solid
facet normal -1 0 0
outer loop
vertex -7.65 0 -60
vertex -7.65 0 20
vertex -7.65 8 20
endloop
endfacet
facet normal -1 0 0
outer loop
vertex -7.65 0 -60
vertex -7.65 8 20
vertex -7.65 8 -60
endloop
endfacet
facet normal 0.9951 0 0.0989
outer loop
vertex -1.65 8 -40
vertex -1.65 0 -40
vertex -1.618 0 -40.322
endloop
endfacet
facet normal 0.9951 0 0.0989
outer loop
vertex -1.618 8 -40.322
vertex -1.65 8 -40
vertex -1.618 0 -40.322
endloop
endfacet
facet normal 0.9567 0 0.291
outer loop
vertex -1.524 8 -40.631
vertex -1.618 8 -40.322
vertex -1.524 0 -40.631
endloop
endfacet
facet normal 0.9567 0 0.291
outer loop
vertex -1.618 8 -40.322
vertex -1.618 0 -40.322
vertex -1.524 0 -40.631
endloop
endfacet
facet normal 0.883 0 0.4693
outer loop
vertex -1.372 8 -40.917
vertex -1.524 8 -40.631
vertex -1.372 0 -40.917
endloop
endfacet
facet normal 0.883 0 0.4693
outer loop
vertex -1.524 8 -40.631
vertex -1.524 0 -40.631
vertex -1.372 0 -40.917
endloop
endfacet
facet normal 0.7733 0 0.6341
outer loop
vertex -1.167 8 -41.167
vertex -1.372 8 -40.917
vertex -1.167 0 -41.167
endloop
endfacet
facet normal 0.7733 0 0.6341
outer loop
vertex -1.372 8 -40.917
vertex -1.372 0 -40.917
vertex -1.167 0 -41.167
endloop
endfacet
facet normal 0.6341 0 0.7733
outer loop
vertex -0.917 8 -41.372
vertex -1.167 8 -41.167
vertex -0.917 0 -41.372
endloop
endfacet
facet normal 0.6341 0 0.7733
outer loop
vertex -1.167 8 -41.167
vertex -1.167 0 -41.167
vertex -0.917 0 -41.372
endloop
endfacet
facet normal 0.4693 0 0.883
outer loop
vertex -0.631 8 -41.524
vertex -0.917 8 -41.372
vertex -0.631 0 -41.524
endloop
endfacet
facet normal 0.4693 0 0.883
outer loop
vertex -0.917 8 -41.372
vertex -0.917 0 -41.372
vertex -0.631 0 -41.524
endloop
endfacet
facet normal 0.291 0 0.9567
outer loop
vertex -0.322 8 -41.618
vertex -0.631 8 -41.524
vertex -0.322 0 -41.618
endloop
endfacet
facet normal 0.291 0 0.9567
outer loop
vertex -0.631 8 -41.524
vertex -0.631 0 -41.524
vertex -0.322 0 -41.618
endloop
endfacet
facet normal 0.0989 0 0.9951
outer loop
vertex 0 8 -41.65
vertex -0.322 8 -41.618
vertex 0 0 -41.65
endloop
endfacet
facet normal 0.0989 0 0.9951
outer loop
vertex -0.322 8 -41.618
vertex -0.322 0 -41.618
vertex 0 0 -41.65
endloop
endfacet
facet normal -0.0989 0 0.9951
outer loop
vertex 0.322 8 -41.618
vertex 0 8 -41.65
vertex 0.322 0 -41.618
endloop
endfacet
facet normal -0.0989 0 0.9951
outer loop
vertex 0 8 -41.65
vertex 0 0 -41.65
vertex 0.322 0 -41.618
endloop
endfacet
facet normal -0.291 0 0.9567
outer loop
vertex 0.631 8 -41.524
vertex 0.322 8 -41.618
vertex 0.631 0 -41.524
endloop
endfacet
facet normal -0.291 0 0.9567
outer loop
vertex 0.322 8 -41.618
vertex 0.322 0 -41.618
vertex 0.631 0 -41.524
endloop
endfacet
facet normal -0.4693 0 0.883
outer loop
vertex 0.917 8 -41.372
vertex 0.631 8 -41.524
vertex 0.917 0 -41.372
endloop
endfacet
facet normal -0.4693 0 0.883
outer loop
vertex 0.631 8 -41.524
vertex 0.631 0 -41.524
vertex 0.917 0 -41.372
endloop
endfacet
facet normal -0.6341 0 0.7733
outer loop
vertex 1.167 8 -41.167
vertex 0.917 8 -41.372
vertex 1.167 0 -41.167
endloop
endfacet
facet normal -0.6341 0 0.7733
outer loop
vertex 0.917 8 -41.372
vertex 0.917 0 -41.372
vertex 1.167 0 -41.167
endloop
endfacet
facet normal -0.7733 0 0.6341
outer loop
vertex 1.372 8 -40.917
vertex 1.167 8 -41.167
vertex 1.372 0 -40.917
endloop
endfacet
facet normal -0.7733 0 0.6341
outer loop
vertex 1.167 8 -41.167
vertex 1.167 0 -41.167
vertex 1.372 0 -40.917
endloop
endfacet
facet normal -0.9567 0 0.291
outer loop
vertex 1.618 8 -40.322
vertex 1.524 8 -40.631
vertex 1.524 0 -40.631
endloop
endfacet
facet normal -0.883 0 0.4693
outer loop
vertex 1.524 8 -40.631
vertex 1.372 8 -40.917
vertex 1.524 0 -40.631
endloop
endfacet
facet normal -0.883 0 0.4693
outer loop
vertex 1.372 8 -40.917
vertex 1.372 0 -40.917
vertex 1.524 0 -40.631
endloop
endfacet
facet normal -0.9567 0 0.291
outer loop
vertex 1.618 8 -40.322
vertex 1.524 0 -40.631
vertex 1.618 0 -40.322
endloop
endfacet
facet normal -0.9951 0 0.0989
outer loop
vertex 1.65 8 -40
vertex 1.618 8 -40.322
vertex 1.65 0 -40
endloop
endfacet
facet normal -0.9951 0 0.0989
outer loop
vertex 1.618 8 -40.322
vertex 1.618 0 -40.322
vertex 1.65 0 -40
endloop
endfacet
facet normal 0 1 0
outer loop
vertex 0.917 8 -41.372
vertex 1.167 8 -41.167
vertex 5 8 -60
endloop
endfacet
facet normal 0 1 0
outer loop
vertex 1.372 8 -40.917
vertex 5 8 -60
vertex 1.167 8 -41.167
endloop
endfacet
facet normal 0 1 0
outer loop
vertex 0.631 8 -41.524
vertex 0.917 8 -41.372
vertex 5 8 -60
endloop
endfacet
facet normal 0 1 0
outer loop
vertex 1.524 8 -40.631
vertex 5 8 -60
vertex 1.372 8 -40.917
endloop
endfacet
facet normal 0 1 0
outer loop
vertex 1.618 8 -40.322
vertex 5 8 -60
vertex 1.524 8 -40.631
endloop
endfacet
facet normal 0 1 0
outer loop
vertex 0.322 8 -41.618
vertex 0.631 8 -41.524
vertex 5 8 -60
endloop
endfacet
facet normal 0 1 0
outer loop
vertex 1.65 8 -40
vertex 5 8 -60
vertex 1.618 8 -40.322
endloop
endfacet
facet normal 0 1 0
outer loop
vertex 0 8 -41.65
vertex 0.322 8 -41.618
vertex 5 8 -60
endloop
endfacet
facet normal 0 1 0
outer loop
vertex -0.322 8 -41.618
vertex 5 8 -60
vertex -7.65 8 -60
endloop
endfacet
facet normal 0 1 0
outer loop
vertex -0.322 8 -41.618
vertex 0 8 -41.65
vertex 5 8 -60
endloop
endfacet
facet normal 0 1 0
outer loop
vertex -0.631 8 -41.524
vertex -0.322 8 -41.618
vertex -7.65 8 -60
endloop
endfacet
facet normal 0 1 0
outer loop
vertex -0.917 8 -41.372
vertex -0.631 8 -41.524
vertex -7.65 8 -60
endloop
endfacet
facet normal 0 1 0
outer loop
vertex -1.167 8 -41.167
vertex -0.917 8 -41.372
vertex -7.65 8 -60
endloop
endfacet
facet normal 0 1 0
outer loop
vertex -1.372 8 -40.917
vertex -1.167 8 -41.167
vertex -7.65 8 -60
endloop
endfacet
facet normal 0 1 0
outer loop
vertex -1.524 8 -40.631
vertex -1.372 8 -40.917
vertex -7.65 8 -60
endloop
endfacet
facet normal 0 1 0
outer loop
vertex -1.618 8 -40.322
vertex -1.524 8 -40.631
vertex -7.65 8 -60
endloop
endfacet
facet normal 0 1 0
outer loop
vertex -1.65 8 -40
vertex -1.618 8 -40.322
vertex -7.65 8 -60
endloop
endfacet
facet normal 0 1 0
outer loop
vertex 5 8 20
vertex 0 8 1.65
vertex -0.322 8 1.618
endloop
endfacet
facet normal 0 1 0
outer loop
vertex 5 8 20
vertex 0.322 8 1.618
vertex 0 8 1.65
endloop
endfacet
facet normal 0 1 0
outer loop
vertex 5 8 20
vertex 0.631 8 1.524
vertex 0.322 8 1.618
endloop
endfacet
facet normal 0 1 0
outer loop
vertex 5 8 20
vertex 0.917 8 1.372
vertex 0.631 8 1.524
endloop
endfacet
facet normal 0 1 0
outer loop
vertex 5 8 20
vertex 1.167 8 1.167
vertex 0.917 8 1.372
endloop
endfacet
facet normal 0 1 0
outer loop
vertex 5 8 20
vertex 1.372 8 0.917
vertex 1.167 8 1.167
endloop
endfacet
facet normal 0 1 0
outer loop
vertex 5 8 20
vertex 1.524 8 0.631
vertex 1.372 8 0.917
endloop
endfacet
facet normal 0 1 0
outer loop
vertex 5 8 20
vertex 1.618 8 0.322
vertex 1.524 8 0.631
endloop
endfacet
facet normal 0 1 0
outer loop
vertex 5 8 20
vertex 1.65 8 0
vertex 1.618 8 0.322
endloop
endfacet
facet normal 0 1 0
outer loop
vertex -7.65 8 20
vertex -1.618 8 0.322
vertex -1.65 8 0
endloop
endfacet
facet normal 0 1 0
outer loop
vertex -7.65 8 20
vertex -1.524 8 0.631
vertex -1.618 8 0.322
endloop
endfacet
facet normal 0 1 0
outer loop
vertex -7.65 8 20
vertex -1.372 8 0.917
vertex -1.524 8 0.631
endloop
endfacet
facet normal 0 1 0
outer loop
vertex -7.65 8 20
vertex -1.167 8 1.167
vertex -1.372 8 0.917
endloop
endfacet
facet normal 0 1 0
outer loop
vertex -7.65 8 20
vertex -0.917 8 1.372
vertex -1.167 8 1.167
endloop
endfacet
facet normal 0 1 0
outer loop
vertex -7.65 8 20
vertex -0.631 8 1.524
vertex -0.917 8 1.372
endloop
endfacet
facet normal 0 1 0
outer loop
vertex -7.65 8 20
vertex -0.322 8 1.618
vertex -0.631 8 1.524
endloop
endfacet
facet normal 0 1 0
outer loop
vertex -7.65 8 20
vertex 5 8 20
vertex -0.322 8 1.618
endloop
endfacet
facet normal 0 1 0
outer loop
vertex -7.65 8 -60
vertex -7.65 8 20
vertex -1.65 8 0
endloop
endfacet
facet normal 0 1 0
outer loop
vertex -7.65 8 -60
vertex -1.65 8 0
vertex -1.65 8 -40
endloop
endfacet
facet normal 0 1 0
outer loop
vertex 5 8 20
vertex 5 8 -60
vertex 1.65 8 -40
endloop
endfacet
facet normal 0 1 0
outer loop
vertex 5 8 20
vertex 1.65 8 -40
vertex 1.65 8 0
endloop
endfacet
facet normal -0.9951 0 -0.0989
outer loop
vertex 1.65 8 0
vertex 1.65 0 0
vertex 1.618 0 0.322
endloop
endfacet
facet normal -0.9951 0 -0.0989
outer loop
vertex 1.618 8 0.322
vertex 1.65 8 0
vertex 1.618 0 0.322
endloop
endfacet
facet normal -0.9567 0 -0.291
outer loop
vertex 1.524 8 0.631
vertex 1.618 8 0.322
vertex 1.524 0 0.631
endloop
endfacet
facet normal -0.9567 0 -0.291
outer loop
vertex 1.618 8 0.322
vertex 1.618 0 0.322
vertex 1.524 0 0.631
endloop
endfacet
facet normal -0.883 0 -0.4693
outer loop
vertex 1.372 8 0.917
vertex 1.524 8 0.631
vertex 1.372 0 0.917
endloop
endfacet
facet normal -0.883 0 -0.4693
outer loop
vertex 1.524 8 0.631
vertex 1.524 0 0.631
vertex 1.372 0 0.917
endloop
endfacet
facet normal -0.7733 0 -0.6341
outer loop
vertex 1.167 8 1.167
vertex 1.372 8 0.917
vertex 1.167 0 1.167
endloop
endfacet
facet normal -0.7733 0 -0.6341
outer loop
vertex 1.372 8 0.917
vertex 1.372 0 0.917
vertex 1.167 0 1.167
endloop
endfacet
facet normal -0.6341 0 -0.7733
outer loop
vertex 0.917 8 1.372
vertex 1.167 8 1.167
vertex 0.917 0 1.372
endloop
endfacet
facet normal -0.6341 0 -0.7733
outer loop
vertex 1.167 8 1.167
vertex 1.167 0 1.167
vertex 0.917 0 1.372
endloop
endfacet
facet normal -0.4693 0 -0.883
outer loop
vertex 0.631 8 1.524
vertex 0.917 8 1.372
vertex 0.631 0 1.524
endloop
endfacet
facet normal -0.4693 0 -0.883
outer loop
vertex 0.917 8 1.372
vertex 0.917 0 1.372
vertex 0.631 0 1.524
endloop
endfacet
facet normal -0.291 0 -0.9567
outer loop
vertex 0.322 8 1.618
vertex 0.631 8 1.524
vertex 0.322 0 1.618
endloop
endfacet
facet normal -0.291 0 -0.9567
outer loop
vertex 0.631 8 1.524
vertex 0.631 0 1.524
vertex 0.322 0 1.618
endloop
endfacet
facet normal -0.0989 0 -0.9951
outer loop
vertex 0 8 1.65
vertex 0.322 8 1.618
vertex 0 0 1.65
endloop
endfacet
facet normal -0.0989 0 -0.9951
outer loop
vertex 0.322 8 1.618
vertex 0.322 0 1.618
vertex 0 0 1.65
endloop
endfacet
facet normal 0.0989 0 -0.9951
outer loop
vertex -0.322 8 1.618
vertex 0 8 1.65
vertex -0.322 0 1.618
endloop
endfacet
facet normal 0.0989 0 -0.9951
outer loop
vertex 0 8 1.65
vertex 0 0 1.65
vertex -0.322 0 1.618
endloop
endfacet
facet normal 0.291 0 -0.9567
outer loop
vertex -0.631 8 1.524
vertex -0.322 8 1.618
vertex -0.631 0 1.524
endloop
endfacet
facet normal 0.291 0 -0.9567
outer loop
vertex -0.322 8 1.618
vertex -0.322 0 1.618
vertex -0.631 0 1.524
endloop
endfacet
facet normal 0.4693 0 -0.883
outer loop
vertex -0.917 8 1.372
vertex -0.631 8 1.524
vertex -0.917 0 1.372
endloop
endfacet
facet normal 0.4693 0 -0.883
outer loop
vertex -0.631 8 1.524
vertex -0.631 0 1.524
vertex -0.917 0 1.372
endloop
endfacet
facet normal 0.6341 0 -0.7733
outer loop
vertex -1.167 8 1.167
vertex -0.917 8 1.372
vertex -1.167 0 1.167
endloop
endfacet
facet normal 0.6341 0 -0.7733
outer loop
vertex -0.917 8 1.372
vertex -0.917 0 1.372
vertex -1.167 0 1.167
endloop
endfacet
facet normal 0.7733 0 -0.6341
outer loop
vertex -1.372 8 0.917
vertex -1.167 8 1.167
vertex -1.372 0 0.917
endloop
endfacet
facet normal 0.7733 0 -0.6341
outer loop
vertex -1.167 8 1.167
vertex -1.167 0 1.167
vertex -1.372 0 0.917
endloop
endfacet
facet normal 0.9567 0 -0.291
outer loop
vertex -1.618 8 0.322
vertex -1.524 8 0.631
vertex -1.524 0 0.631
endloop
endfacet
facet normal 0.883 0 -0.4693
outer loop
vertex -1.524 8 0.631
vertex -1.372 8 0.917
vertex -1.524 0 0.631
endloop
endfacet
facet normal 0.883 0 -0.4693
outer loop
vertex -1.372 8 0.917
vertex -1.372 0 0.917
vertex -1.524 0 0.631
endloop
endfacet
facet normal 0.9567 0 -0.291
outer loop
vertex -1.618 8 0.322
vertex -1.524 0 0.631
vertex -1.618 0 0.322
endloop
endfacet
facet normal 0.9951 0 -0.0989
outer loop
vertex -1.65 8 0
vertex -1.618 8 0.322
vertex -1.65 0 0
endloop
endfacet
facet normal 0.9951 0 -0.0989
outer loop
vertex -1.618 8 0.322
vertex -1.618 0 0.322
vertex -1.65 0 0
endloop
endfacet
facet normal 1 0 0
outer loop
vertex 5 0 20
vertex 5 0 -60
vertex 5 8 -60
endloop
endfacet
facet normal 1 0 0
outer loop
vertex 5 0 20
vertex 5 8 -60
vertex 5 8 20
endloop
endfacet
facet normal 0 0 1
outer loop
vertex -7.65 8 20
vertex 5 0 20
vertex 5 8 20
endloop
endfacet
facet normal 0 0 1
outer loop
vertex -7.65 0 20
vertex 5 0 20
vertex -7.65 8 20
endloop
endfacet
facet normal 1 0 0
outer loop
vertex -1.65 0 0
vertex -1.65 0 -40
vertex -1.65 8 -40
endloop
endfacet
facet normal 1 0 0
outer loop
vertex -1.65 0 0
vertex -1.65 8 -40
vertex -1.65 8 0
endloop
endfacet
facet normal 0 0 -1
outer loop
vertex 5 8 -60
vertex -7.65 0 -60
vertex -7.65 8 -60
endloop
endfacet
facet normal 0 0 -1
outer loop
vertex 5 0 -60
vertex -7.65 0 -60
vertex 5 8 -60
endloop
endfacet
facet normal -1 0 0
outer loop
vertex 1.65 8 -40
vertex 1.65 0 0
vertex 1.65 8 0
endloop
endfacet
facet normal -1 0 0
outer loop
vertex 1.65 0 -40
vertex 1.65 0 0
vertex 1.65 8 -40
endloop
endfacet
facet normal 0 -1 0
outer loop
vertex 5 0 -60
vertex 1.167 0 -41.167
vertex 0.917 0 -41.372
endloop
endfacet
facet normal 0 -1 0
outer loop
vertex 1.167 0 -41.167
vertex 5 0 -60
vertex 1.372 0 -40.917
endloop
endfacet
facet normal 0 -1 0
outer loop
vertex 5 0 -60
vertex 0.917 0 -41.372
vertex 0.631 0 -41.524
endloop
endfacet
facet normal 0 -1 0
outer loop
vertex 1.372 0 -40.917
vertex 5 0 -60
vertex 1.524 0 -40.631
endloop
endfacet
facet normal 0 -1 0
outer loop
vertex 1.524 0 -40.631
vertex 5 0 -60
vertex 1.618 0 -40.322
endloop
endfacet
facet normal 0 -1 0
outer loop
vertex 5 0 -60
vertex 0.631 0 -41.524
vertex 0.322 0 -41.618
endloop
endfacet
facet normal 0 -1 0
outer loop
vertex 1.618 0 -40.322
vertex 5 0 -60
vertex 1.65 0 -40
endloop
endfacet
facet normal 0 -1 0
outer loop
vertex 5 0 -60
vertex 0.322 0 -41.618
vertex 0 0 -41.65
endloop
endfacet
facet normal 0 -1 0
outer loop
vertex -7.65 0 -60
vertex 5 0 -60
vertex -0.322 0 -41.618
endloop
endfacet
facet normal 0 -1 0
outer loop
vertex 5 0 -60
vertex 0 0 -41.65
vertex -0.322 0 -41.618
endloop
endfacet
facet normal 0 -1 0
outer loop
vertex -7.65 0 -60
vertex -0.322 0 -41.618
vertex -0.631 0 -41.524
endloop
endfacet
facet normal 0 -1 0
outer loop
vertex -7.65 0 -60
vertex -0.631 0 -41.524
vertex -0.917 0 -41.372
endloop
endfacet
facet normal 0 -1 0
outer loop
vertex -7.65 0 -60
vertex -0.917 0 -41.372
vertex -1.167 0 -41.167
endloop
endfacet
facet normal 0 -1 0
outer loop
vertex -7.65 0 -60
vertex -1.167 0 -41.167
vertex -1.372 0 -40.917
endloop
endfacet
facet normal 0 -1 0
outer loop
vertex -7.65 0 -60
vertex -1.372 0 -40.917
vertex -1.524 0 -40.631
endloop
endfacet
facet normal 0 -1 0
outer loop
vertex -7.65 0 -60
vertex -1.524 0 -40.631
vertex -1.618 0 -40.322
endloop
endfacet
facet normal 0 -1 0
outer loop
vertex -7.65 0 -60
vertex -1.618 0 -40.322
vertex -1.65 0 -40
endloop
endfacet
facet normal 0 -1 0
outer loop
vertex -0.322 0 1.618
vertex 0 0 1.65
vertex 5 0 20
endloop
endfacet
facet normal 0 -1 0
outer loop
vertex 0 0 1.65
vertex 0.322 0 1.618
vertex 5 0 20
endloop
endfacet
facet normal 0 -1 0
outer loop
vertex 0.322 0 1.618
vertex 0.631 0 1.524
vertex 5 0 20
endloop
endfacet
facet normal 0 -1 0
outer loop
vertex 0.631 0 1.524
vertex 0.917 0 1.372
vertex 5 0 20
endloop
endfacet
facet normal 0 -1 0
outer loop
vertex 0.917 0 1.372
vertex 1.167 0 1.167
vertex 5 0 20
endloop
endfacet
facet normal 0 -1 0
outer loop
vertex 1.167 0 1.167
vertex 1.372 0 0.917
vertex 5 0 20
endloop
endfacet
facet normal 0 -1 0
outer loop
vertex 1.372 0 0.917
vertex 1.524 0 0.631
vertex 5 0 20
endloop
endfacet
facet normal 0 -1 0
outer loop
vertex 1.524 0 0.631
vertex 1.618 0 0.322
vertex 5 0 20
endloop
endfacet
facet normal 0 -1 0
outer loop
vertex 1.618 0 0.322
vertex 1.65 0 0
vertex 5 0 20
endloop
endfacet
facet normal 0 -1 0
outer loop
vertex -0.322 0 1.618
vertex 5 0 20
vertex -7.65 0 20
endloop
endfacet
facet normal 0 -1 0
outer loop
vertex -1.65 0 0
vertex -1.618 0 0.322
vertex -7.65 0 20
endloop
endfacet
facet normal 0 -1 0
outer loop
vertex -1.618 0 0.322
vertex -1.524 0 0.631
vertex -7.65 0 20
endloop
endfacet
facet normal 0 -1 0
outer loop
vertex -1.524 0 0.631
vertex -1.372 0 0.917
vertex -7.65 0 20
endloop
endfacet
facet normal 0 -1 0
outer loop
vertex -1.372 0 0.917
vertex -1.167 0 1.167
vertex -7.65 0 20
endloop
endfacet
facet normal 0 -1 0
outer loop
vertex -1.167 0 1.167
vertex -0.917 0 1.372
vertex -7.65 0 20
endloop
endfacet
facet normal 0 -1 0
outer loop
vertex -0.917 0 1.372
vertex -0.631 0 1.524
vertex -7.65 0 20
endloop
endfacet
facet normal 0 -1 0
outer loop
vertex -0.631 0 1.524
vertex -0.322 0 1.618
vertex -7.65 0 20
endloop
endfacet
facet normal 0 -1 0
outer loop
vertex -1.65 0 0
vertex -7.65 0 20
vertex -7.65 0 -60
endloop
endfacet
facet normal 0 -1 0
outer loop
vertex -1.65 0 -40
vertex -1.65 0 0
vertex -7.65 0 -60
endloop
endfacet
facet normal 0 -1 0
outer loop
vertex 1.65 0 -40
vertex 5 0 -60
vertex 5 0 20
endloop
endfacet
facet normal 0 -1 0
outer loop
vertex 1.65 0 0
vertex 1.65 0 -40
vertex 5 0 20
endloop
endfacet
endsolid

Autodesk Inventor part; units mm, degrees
ref_plane "YZ Plane" through (0, 0, 0) normal (1, 0, 0) x (0, 1, 0)
ref_plane "XZ Plane" through (0, 0, 0) normal (0, 1, 0) x (-1, 0, 0)
ref_plane "XY Plane" through (0, 0, 0) normal (0, 0, 1) x (1, 0, 0)
sketch "Sketch1" plane through (0, 0, 0) normal (0, 1, 0) x (-1, 0, 0)
  line L0 (0, 0) -> (0, -40) construction
  line L1 (-1.65, 0) -> (-1.65, -40)
  line L2 (1.65, -40) -> (1.65, 0)
  arc A0 (1.65, 0) -> (-1.65, 0) centre (0, 0) ccw
  arc A1 (-1.65, -40) -> (1.65, -40) centre (0, -40) ccw
  line L3 (-5, 20) -> (7.65, 20)
  line L4 (7.65, 20) -> (7.65, -60)
  line L5 (7.65, -60) -> (-5, -60)
  line L6 (-5, -60) -> (-5, 20)
  circle A2 centre (0, -40) radius 5
  circle A3 centre (0, 0) radius 5
  point P0 (0, -20)
  dimension "d0" = 3.3
  dimension "d1" = 40
  dimension "d2" = 10
  dimension "d3" = 10
  dimension "d4" = 20
  dimension "d5" = 20
  dimension "d6" = 6
extrude "Extrusion1" add sketch "Sketch1" along normal blind 8 contours L1 A3 L2 A0 | L1 A2 L6 A3 | L1 A1 L2 A2 | L6 L3 L4 L5 A2 L2 A3 picked at (-2.0178, -2.9645) picked at (-2.0178, -37.0355)
ref_plane "Work Plane1" through (0, 0, 0) normal (1, 0, 0) x (0, 0, -1)
properties part number "Rail"
